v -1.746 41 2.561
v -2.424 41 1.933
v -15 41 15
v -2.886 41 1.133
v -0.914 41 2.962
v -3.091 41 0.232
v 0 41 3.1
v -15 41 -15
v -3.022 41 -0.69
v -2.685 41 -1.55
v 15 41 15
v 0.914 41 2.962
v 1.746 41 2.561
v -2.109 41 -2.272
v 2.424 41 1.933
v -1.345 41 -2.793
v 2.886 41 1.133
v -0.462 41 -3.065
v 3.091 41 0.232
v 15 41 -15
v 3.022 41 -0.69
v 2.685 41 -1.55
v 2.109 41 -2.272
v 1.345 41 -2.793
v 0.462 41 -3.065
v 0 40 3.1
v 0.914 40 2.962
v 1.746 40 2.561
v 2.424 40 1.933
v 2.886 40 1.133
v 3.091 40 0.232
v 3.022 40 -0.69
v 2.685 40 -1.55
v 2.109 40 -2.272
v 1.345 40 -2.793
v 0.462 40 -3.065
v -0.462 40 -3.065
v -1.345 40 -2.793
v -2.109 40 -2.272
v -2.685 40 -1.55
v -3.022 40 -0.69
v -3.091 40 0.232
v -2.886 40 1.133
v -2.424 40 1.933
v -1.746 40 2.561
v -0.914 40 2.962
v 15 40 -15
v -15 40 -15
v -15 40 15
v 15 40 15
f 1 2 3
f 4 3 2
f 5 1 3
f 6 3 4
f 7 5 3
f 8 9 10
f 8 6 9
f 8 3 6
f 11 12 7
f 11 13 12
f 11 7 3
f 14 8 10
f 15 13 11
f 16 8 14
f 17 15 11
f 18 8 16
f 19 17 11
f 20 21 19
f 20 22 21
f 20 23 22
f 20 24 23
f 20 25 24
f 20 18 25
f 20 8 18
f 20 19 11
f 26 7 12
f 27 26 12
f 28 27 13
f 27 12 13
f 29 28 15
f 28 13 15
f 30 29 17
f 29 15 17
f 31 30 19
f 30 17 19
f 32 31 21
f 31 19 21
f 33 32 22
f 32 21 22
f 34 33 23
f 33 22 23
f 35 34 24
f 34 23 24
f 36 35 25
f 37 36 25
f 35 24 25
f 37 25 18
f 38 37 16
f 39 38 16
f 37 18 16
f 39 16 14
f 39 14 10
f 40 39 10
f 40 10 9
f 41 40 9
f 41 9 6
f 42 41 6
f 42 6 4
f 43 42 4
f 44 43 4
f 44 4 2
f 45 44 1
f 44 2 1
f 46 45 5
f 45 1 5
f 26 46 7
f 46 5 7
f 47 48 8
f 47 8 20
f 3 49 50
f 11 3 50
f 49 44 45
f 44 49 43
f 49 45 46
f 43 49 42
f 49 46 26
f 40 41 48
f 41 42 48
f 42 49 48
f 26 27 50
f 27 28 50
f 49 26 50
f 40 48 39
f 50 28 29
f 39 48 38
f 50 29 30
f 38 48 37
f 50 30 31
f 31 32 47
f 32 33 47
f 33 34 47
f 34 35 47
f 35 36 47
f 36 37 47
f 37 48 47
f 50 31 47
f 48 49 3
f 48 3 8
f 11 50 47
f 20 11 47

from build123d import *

# Parameters (mm, degrees)
SKETCH2_W                = 30
SKETCH2_H                = 30
BOSS_EXTRUDE1_DEPTH      = 10
SKETCH3_W                = 30
SKETCH3_H                = 30
SKETCH3_W_2              = 25
SKETCH3_H_2              = 25
BOSS_EXTRUDE2_DEPTH      = 15
SKETCH4_W                = 30
SKETCH4_H                = 30
BOSS_EXTRUDE3_DEPTH      = 15
CUT_EXTRUDE1_START       = -40
SKETCH5_R                = 3.05
CUT_EXTRUDE1_DEPTH       = 40
BOSS_EXTRUDE4_DEPTH      = 10
BOSS_EXTRUDE4_DEPTH_BACK = 40
SKETCH6_W                = 7.5
SKETCH6_H                = 1.017843133
SKETCH6_H_2              = 1.2761833
SKETCH7_R                = 2.76
CUT_EXTRUDE2_DEPTH       = 10
SKETCH8_W                = 30
SKETCH8_H                = 30
BOSS_EXTRUDE5_DEPTH      = 1
SKETCH9_R                = 3.1
CUT_EXTRUDE3_DEPTH       = 1


with BuildPart() as part:
    # Sketch2 → Boss-Extrude1 (new body)
    with BuildSketch(Plane(origin=(0, 0, 0), x_dir=(1, 0, 0), z_dir=(0, 1, 0))):
        Rectangle(SKETCH2_W, SKETCH2_H)
    extrude(amount=BOSS_EXTRUDE1_DEPTH)


with BuildPart() as body_2:
    # Sketch3 → Boss-Extrude2 (new body)
    with BuildSketch(Plane(origin=(0, 10, 0), x_dir=(1, 0, 0), z_dir=(0, 1, 0))):
        Rectangle(SKETCH3_W, SKETCH3_H)
        Rectangle(SKETCH3_W_2, SKETCH3_H_2, mode=Mode.SUBTRACT)
    extrude(amount=BOSS_EXTRUDE2_DEPTH)


with BuildPart() as body_3:
    # Sketch4 → Boss-Extrude3 (new body)
    with BuildSketch(Plane(origin=(0, 25, 0), x_dir=(1, 0, 0), z_dir=(0, 1, 0))):
        Rectangle(SKETCH4_W, SKETCH4_H)
    extrude(amount=BOSS_EXTRUDE3_DEPTH)


with BuildPart() as cut_extrude1_tool:
    # Sketch5 → Cut-Extrude1 (new body)
    with BuildSketch(Plane(origin=(0, 40, 0), x_dir=(1, 0, 0), z_dir=(0, 1, 0)).offset(CUT_EXTRUDE1_START)):
        with Locations(Location((0, 0, 0), (0, 0, 270))):
            Circle(SKETCH5_R)
    extrude(amount=CUT_EXTRUDE1_DEPTH)


with BuildPart() as part_1:
    add(part.part)

    # Cut-Extrude1: cut by cut_extrude1_tool
    add(cut_extrude1_tool.part, mode=Mode.SUBTRACT)


with BuildPart() as body_3_1:
    add(body_3.part)

    # Cut-Extrude1: cut by cut_extrude1_tool
    add(cut_extrude1_tool.part, mode=Mode.SUBTRACT)

    # Sketch6 → Boss-Extrude4 (add, two sides: drawn at the far end of the back side and taken through both)
    with BuildSketch(Plane(origin=(0, 0, -15), x_dir=(-1, 0, 0), z_dir=(0, 0, -1)).offset(-BOSS_EXTRUDE4_DEPTH_BACK)):
        with Locations((-11.25, 25.508921566)):
            Rectangle(SKETCH6_W, SKETCH6_H)
        with Locations((11.25, 25.63809165)):
            Rectangle(SKETCH6_W, SKETCH6_H_2)
    extrude(amount=BOSS_EXTRUDE4_DEPTH + BOSS_EXTRUDE4_DEPTH_BACK)

    # Sketch7 → Cut-Extrude2 (cut)
    with BuildSketch(Plane(origin=(0, 26.2761833, 0), x_dir=(1, 0, 0), z_dir=(0, 1, 0))):
        with Locations(Location((-11.25, 20, 0), (0, 0, 270))):
            Circle(SKETCH7_R)
        with Locations(Location((11.25, 20, 0), (0, 0, 270))):
            Circle(SKETCH7_R)
        with Locations(Location((11.25, -20.5, 0), (0, 0, 270))):
            Circle(SKETCH7_R)
        with Locations(Location((-11.25, -20.5, 0), (0, 0, 270))):
            Circle(SKETCH7_R)
    extrude(amount=-CUT_EXTRUDE2_DEPTH, mode=Mode.SUBTRACT)


with BuildPart() as body_2_2:
    # Sketch8 → Boss-Extrude5 (new body)
    with BuildSketch(Plane(origin=(0, 40, 0), x_dir=(1, 0, 0), z_dir=(0, 1, 0))):
        Rectangle(SKETCH8_W, SKETCH8_H)
    extrude(amount=BOSS_EXTRUDE5_DEPTH)

    # Sketch9 → Cut-Extrude3 (cut)
    with BuildSketch(Plane(origin=(0, 41, 0), x_dir=(1, 0, 0), z_dir=(0, 1, 0))):
        with Locations(Location((0, 0, 0), (0, 0, 270))):
            Circle(SKETCH9_R)
    extrude(amount=-CUT_EXTRUDE3_DEPTH, mode=Mode.SUBTRACT)


solid = body_2_2.part
